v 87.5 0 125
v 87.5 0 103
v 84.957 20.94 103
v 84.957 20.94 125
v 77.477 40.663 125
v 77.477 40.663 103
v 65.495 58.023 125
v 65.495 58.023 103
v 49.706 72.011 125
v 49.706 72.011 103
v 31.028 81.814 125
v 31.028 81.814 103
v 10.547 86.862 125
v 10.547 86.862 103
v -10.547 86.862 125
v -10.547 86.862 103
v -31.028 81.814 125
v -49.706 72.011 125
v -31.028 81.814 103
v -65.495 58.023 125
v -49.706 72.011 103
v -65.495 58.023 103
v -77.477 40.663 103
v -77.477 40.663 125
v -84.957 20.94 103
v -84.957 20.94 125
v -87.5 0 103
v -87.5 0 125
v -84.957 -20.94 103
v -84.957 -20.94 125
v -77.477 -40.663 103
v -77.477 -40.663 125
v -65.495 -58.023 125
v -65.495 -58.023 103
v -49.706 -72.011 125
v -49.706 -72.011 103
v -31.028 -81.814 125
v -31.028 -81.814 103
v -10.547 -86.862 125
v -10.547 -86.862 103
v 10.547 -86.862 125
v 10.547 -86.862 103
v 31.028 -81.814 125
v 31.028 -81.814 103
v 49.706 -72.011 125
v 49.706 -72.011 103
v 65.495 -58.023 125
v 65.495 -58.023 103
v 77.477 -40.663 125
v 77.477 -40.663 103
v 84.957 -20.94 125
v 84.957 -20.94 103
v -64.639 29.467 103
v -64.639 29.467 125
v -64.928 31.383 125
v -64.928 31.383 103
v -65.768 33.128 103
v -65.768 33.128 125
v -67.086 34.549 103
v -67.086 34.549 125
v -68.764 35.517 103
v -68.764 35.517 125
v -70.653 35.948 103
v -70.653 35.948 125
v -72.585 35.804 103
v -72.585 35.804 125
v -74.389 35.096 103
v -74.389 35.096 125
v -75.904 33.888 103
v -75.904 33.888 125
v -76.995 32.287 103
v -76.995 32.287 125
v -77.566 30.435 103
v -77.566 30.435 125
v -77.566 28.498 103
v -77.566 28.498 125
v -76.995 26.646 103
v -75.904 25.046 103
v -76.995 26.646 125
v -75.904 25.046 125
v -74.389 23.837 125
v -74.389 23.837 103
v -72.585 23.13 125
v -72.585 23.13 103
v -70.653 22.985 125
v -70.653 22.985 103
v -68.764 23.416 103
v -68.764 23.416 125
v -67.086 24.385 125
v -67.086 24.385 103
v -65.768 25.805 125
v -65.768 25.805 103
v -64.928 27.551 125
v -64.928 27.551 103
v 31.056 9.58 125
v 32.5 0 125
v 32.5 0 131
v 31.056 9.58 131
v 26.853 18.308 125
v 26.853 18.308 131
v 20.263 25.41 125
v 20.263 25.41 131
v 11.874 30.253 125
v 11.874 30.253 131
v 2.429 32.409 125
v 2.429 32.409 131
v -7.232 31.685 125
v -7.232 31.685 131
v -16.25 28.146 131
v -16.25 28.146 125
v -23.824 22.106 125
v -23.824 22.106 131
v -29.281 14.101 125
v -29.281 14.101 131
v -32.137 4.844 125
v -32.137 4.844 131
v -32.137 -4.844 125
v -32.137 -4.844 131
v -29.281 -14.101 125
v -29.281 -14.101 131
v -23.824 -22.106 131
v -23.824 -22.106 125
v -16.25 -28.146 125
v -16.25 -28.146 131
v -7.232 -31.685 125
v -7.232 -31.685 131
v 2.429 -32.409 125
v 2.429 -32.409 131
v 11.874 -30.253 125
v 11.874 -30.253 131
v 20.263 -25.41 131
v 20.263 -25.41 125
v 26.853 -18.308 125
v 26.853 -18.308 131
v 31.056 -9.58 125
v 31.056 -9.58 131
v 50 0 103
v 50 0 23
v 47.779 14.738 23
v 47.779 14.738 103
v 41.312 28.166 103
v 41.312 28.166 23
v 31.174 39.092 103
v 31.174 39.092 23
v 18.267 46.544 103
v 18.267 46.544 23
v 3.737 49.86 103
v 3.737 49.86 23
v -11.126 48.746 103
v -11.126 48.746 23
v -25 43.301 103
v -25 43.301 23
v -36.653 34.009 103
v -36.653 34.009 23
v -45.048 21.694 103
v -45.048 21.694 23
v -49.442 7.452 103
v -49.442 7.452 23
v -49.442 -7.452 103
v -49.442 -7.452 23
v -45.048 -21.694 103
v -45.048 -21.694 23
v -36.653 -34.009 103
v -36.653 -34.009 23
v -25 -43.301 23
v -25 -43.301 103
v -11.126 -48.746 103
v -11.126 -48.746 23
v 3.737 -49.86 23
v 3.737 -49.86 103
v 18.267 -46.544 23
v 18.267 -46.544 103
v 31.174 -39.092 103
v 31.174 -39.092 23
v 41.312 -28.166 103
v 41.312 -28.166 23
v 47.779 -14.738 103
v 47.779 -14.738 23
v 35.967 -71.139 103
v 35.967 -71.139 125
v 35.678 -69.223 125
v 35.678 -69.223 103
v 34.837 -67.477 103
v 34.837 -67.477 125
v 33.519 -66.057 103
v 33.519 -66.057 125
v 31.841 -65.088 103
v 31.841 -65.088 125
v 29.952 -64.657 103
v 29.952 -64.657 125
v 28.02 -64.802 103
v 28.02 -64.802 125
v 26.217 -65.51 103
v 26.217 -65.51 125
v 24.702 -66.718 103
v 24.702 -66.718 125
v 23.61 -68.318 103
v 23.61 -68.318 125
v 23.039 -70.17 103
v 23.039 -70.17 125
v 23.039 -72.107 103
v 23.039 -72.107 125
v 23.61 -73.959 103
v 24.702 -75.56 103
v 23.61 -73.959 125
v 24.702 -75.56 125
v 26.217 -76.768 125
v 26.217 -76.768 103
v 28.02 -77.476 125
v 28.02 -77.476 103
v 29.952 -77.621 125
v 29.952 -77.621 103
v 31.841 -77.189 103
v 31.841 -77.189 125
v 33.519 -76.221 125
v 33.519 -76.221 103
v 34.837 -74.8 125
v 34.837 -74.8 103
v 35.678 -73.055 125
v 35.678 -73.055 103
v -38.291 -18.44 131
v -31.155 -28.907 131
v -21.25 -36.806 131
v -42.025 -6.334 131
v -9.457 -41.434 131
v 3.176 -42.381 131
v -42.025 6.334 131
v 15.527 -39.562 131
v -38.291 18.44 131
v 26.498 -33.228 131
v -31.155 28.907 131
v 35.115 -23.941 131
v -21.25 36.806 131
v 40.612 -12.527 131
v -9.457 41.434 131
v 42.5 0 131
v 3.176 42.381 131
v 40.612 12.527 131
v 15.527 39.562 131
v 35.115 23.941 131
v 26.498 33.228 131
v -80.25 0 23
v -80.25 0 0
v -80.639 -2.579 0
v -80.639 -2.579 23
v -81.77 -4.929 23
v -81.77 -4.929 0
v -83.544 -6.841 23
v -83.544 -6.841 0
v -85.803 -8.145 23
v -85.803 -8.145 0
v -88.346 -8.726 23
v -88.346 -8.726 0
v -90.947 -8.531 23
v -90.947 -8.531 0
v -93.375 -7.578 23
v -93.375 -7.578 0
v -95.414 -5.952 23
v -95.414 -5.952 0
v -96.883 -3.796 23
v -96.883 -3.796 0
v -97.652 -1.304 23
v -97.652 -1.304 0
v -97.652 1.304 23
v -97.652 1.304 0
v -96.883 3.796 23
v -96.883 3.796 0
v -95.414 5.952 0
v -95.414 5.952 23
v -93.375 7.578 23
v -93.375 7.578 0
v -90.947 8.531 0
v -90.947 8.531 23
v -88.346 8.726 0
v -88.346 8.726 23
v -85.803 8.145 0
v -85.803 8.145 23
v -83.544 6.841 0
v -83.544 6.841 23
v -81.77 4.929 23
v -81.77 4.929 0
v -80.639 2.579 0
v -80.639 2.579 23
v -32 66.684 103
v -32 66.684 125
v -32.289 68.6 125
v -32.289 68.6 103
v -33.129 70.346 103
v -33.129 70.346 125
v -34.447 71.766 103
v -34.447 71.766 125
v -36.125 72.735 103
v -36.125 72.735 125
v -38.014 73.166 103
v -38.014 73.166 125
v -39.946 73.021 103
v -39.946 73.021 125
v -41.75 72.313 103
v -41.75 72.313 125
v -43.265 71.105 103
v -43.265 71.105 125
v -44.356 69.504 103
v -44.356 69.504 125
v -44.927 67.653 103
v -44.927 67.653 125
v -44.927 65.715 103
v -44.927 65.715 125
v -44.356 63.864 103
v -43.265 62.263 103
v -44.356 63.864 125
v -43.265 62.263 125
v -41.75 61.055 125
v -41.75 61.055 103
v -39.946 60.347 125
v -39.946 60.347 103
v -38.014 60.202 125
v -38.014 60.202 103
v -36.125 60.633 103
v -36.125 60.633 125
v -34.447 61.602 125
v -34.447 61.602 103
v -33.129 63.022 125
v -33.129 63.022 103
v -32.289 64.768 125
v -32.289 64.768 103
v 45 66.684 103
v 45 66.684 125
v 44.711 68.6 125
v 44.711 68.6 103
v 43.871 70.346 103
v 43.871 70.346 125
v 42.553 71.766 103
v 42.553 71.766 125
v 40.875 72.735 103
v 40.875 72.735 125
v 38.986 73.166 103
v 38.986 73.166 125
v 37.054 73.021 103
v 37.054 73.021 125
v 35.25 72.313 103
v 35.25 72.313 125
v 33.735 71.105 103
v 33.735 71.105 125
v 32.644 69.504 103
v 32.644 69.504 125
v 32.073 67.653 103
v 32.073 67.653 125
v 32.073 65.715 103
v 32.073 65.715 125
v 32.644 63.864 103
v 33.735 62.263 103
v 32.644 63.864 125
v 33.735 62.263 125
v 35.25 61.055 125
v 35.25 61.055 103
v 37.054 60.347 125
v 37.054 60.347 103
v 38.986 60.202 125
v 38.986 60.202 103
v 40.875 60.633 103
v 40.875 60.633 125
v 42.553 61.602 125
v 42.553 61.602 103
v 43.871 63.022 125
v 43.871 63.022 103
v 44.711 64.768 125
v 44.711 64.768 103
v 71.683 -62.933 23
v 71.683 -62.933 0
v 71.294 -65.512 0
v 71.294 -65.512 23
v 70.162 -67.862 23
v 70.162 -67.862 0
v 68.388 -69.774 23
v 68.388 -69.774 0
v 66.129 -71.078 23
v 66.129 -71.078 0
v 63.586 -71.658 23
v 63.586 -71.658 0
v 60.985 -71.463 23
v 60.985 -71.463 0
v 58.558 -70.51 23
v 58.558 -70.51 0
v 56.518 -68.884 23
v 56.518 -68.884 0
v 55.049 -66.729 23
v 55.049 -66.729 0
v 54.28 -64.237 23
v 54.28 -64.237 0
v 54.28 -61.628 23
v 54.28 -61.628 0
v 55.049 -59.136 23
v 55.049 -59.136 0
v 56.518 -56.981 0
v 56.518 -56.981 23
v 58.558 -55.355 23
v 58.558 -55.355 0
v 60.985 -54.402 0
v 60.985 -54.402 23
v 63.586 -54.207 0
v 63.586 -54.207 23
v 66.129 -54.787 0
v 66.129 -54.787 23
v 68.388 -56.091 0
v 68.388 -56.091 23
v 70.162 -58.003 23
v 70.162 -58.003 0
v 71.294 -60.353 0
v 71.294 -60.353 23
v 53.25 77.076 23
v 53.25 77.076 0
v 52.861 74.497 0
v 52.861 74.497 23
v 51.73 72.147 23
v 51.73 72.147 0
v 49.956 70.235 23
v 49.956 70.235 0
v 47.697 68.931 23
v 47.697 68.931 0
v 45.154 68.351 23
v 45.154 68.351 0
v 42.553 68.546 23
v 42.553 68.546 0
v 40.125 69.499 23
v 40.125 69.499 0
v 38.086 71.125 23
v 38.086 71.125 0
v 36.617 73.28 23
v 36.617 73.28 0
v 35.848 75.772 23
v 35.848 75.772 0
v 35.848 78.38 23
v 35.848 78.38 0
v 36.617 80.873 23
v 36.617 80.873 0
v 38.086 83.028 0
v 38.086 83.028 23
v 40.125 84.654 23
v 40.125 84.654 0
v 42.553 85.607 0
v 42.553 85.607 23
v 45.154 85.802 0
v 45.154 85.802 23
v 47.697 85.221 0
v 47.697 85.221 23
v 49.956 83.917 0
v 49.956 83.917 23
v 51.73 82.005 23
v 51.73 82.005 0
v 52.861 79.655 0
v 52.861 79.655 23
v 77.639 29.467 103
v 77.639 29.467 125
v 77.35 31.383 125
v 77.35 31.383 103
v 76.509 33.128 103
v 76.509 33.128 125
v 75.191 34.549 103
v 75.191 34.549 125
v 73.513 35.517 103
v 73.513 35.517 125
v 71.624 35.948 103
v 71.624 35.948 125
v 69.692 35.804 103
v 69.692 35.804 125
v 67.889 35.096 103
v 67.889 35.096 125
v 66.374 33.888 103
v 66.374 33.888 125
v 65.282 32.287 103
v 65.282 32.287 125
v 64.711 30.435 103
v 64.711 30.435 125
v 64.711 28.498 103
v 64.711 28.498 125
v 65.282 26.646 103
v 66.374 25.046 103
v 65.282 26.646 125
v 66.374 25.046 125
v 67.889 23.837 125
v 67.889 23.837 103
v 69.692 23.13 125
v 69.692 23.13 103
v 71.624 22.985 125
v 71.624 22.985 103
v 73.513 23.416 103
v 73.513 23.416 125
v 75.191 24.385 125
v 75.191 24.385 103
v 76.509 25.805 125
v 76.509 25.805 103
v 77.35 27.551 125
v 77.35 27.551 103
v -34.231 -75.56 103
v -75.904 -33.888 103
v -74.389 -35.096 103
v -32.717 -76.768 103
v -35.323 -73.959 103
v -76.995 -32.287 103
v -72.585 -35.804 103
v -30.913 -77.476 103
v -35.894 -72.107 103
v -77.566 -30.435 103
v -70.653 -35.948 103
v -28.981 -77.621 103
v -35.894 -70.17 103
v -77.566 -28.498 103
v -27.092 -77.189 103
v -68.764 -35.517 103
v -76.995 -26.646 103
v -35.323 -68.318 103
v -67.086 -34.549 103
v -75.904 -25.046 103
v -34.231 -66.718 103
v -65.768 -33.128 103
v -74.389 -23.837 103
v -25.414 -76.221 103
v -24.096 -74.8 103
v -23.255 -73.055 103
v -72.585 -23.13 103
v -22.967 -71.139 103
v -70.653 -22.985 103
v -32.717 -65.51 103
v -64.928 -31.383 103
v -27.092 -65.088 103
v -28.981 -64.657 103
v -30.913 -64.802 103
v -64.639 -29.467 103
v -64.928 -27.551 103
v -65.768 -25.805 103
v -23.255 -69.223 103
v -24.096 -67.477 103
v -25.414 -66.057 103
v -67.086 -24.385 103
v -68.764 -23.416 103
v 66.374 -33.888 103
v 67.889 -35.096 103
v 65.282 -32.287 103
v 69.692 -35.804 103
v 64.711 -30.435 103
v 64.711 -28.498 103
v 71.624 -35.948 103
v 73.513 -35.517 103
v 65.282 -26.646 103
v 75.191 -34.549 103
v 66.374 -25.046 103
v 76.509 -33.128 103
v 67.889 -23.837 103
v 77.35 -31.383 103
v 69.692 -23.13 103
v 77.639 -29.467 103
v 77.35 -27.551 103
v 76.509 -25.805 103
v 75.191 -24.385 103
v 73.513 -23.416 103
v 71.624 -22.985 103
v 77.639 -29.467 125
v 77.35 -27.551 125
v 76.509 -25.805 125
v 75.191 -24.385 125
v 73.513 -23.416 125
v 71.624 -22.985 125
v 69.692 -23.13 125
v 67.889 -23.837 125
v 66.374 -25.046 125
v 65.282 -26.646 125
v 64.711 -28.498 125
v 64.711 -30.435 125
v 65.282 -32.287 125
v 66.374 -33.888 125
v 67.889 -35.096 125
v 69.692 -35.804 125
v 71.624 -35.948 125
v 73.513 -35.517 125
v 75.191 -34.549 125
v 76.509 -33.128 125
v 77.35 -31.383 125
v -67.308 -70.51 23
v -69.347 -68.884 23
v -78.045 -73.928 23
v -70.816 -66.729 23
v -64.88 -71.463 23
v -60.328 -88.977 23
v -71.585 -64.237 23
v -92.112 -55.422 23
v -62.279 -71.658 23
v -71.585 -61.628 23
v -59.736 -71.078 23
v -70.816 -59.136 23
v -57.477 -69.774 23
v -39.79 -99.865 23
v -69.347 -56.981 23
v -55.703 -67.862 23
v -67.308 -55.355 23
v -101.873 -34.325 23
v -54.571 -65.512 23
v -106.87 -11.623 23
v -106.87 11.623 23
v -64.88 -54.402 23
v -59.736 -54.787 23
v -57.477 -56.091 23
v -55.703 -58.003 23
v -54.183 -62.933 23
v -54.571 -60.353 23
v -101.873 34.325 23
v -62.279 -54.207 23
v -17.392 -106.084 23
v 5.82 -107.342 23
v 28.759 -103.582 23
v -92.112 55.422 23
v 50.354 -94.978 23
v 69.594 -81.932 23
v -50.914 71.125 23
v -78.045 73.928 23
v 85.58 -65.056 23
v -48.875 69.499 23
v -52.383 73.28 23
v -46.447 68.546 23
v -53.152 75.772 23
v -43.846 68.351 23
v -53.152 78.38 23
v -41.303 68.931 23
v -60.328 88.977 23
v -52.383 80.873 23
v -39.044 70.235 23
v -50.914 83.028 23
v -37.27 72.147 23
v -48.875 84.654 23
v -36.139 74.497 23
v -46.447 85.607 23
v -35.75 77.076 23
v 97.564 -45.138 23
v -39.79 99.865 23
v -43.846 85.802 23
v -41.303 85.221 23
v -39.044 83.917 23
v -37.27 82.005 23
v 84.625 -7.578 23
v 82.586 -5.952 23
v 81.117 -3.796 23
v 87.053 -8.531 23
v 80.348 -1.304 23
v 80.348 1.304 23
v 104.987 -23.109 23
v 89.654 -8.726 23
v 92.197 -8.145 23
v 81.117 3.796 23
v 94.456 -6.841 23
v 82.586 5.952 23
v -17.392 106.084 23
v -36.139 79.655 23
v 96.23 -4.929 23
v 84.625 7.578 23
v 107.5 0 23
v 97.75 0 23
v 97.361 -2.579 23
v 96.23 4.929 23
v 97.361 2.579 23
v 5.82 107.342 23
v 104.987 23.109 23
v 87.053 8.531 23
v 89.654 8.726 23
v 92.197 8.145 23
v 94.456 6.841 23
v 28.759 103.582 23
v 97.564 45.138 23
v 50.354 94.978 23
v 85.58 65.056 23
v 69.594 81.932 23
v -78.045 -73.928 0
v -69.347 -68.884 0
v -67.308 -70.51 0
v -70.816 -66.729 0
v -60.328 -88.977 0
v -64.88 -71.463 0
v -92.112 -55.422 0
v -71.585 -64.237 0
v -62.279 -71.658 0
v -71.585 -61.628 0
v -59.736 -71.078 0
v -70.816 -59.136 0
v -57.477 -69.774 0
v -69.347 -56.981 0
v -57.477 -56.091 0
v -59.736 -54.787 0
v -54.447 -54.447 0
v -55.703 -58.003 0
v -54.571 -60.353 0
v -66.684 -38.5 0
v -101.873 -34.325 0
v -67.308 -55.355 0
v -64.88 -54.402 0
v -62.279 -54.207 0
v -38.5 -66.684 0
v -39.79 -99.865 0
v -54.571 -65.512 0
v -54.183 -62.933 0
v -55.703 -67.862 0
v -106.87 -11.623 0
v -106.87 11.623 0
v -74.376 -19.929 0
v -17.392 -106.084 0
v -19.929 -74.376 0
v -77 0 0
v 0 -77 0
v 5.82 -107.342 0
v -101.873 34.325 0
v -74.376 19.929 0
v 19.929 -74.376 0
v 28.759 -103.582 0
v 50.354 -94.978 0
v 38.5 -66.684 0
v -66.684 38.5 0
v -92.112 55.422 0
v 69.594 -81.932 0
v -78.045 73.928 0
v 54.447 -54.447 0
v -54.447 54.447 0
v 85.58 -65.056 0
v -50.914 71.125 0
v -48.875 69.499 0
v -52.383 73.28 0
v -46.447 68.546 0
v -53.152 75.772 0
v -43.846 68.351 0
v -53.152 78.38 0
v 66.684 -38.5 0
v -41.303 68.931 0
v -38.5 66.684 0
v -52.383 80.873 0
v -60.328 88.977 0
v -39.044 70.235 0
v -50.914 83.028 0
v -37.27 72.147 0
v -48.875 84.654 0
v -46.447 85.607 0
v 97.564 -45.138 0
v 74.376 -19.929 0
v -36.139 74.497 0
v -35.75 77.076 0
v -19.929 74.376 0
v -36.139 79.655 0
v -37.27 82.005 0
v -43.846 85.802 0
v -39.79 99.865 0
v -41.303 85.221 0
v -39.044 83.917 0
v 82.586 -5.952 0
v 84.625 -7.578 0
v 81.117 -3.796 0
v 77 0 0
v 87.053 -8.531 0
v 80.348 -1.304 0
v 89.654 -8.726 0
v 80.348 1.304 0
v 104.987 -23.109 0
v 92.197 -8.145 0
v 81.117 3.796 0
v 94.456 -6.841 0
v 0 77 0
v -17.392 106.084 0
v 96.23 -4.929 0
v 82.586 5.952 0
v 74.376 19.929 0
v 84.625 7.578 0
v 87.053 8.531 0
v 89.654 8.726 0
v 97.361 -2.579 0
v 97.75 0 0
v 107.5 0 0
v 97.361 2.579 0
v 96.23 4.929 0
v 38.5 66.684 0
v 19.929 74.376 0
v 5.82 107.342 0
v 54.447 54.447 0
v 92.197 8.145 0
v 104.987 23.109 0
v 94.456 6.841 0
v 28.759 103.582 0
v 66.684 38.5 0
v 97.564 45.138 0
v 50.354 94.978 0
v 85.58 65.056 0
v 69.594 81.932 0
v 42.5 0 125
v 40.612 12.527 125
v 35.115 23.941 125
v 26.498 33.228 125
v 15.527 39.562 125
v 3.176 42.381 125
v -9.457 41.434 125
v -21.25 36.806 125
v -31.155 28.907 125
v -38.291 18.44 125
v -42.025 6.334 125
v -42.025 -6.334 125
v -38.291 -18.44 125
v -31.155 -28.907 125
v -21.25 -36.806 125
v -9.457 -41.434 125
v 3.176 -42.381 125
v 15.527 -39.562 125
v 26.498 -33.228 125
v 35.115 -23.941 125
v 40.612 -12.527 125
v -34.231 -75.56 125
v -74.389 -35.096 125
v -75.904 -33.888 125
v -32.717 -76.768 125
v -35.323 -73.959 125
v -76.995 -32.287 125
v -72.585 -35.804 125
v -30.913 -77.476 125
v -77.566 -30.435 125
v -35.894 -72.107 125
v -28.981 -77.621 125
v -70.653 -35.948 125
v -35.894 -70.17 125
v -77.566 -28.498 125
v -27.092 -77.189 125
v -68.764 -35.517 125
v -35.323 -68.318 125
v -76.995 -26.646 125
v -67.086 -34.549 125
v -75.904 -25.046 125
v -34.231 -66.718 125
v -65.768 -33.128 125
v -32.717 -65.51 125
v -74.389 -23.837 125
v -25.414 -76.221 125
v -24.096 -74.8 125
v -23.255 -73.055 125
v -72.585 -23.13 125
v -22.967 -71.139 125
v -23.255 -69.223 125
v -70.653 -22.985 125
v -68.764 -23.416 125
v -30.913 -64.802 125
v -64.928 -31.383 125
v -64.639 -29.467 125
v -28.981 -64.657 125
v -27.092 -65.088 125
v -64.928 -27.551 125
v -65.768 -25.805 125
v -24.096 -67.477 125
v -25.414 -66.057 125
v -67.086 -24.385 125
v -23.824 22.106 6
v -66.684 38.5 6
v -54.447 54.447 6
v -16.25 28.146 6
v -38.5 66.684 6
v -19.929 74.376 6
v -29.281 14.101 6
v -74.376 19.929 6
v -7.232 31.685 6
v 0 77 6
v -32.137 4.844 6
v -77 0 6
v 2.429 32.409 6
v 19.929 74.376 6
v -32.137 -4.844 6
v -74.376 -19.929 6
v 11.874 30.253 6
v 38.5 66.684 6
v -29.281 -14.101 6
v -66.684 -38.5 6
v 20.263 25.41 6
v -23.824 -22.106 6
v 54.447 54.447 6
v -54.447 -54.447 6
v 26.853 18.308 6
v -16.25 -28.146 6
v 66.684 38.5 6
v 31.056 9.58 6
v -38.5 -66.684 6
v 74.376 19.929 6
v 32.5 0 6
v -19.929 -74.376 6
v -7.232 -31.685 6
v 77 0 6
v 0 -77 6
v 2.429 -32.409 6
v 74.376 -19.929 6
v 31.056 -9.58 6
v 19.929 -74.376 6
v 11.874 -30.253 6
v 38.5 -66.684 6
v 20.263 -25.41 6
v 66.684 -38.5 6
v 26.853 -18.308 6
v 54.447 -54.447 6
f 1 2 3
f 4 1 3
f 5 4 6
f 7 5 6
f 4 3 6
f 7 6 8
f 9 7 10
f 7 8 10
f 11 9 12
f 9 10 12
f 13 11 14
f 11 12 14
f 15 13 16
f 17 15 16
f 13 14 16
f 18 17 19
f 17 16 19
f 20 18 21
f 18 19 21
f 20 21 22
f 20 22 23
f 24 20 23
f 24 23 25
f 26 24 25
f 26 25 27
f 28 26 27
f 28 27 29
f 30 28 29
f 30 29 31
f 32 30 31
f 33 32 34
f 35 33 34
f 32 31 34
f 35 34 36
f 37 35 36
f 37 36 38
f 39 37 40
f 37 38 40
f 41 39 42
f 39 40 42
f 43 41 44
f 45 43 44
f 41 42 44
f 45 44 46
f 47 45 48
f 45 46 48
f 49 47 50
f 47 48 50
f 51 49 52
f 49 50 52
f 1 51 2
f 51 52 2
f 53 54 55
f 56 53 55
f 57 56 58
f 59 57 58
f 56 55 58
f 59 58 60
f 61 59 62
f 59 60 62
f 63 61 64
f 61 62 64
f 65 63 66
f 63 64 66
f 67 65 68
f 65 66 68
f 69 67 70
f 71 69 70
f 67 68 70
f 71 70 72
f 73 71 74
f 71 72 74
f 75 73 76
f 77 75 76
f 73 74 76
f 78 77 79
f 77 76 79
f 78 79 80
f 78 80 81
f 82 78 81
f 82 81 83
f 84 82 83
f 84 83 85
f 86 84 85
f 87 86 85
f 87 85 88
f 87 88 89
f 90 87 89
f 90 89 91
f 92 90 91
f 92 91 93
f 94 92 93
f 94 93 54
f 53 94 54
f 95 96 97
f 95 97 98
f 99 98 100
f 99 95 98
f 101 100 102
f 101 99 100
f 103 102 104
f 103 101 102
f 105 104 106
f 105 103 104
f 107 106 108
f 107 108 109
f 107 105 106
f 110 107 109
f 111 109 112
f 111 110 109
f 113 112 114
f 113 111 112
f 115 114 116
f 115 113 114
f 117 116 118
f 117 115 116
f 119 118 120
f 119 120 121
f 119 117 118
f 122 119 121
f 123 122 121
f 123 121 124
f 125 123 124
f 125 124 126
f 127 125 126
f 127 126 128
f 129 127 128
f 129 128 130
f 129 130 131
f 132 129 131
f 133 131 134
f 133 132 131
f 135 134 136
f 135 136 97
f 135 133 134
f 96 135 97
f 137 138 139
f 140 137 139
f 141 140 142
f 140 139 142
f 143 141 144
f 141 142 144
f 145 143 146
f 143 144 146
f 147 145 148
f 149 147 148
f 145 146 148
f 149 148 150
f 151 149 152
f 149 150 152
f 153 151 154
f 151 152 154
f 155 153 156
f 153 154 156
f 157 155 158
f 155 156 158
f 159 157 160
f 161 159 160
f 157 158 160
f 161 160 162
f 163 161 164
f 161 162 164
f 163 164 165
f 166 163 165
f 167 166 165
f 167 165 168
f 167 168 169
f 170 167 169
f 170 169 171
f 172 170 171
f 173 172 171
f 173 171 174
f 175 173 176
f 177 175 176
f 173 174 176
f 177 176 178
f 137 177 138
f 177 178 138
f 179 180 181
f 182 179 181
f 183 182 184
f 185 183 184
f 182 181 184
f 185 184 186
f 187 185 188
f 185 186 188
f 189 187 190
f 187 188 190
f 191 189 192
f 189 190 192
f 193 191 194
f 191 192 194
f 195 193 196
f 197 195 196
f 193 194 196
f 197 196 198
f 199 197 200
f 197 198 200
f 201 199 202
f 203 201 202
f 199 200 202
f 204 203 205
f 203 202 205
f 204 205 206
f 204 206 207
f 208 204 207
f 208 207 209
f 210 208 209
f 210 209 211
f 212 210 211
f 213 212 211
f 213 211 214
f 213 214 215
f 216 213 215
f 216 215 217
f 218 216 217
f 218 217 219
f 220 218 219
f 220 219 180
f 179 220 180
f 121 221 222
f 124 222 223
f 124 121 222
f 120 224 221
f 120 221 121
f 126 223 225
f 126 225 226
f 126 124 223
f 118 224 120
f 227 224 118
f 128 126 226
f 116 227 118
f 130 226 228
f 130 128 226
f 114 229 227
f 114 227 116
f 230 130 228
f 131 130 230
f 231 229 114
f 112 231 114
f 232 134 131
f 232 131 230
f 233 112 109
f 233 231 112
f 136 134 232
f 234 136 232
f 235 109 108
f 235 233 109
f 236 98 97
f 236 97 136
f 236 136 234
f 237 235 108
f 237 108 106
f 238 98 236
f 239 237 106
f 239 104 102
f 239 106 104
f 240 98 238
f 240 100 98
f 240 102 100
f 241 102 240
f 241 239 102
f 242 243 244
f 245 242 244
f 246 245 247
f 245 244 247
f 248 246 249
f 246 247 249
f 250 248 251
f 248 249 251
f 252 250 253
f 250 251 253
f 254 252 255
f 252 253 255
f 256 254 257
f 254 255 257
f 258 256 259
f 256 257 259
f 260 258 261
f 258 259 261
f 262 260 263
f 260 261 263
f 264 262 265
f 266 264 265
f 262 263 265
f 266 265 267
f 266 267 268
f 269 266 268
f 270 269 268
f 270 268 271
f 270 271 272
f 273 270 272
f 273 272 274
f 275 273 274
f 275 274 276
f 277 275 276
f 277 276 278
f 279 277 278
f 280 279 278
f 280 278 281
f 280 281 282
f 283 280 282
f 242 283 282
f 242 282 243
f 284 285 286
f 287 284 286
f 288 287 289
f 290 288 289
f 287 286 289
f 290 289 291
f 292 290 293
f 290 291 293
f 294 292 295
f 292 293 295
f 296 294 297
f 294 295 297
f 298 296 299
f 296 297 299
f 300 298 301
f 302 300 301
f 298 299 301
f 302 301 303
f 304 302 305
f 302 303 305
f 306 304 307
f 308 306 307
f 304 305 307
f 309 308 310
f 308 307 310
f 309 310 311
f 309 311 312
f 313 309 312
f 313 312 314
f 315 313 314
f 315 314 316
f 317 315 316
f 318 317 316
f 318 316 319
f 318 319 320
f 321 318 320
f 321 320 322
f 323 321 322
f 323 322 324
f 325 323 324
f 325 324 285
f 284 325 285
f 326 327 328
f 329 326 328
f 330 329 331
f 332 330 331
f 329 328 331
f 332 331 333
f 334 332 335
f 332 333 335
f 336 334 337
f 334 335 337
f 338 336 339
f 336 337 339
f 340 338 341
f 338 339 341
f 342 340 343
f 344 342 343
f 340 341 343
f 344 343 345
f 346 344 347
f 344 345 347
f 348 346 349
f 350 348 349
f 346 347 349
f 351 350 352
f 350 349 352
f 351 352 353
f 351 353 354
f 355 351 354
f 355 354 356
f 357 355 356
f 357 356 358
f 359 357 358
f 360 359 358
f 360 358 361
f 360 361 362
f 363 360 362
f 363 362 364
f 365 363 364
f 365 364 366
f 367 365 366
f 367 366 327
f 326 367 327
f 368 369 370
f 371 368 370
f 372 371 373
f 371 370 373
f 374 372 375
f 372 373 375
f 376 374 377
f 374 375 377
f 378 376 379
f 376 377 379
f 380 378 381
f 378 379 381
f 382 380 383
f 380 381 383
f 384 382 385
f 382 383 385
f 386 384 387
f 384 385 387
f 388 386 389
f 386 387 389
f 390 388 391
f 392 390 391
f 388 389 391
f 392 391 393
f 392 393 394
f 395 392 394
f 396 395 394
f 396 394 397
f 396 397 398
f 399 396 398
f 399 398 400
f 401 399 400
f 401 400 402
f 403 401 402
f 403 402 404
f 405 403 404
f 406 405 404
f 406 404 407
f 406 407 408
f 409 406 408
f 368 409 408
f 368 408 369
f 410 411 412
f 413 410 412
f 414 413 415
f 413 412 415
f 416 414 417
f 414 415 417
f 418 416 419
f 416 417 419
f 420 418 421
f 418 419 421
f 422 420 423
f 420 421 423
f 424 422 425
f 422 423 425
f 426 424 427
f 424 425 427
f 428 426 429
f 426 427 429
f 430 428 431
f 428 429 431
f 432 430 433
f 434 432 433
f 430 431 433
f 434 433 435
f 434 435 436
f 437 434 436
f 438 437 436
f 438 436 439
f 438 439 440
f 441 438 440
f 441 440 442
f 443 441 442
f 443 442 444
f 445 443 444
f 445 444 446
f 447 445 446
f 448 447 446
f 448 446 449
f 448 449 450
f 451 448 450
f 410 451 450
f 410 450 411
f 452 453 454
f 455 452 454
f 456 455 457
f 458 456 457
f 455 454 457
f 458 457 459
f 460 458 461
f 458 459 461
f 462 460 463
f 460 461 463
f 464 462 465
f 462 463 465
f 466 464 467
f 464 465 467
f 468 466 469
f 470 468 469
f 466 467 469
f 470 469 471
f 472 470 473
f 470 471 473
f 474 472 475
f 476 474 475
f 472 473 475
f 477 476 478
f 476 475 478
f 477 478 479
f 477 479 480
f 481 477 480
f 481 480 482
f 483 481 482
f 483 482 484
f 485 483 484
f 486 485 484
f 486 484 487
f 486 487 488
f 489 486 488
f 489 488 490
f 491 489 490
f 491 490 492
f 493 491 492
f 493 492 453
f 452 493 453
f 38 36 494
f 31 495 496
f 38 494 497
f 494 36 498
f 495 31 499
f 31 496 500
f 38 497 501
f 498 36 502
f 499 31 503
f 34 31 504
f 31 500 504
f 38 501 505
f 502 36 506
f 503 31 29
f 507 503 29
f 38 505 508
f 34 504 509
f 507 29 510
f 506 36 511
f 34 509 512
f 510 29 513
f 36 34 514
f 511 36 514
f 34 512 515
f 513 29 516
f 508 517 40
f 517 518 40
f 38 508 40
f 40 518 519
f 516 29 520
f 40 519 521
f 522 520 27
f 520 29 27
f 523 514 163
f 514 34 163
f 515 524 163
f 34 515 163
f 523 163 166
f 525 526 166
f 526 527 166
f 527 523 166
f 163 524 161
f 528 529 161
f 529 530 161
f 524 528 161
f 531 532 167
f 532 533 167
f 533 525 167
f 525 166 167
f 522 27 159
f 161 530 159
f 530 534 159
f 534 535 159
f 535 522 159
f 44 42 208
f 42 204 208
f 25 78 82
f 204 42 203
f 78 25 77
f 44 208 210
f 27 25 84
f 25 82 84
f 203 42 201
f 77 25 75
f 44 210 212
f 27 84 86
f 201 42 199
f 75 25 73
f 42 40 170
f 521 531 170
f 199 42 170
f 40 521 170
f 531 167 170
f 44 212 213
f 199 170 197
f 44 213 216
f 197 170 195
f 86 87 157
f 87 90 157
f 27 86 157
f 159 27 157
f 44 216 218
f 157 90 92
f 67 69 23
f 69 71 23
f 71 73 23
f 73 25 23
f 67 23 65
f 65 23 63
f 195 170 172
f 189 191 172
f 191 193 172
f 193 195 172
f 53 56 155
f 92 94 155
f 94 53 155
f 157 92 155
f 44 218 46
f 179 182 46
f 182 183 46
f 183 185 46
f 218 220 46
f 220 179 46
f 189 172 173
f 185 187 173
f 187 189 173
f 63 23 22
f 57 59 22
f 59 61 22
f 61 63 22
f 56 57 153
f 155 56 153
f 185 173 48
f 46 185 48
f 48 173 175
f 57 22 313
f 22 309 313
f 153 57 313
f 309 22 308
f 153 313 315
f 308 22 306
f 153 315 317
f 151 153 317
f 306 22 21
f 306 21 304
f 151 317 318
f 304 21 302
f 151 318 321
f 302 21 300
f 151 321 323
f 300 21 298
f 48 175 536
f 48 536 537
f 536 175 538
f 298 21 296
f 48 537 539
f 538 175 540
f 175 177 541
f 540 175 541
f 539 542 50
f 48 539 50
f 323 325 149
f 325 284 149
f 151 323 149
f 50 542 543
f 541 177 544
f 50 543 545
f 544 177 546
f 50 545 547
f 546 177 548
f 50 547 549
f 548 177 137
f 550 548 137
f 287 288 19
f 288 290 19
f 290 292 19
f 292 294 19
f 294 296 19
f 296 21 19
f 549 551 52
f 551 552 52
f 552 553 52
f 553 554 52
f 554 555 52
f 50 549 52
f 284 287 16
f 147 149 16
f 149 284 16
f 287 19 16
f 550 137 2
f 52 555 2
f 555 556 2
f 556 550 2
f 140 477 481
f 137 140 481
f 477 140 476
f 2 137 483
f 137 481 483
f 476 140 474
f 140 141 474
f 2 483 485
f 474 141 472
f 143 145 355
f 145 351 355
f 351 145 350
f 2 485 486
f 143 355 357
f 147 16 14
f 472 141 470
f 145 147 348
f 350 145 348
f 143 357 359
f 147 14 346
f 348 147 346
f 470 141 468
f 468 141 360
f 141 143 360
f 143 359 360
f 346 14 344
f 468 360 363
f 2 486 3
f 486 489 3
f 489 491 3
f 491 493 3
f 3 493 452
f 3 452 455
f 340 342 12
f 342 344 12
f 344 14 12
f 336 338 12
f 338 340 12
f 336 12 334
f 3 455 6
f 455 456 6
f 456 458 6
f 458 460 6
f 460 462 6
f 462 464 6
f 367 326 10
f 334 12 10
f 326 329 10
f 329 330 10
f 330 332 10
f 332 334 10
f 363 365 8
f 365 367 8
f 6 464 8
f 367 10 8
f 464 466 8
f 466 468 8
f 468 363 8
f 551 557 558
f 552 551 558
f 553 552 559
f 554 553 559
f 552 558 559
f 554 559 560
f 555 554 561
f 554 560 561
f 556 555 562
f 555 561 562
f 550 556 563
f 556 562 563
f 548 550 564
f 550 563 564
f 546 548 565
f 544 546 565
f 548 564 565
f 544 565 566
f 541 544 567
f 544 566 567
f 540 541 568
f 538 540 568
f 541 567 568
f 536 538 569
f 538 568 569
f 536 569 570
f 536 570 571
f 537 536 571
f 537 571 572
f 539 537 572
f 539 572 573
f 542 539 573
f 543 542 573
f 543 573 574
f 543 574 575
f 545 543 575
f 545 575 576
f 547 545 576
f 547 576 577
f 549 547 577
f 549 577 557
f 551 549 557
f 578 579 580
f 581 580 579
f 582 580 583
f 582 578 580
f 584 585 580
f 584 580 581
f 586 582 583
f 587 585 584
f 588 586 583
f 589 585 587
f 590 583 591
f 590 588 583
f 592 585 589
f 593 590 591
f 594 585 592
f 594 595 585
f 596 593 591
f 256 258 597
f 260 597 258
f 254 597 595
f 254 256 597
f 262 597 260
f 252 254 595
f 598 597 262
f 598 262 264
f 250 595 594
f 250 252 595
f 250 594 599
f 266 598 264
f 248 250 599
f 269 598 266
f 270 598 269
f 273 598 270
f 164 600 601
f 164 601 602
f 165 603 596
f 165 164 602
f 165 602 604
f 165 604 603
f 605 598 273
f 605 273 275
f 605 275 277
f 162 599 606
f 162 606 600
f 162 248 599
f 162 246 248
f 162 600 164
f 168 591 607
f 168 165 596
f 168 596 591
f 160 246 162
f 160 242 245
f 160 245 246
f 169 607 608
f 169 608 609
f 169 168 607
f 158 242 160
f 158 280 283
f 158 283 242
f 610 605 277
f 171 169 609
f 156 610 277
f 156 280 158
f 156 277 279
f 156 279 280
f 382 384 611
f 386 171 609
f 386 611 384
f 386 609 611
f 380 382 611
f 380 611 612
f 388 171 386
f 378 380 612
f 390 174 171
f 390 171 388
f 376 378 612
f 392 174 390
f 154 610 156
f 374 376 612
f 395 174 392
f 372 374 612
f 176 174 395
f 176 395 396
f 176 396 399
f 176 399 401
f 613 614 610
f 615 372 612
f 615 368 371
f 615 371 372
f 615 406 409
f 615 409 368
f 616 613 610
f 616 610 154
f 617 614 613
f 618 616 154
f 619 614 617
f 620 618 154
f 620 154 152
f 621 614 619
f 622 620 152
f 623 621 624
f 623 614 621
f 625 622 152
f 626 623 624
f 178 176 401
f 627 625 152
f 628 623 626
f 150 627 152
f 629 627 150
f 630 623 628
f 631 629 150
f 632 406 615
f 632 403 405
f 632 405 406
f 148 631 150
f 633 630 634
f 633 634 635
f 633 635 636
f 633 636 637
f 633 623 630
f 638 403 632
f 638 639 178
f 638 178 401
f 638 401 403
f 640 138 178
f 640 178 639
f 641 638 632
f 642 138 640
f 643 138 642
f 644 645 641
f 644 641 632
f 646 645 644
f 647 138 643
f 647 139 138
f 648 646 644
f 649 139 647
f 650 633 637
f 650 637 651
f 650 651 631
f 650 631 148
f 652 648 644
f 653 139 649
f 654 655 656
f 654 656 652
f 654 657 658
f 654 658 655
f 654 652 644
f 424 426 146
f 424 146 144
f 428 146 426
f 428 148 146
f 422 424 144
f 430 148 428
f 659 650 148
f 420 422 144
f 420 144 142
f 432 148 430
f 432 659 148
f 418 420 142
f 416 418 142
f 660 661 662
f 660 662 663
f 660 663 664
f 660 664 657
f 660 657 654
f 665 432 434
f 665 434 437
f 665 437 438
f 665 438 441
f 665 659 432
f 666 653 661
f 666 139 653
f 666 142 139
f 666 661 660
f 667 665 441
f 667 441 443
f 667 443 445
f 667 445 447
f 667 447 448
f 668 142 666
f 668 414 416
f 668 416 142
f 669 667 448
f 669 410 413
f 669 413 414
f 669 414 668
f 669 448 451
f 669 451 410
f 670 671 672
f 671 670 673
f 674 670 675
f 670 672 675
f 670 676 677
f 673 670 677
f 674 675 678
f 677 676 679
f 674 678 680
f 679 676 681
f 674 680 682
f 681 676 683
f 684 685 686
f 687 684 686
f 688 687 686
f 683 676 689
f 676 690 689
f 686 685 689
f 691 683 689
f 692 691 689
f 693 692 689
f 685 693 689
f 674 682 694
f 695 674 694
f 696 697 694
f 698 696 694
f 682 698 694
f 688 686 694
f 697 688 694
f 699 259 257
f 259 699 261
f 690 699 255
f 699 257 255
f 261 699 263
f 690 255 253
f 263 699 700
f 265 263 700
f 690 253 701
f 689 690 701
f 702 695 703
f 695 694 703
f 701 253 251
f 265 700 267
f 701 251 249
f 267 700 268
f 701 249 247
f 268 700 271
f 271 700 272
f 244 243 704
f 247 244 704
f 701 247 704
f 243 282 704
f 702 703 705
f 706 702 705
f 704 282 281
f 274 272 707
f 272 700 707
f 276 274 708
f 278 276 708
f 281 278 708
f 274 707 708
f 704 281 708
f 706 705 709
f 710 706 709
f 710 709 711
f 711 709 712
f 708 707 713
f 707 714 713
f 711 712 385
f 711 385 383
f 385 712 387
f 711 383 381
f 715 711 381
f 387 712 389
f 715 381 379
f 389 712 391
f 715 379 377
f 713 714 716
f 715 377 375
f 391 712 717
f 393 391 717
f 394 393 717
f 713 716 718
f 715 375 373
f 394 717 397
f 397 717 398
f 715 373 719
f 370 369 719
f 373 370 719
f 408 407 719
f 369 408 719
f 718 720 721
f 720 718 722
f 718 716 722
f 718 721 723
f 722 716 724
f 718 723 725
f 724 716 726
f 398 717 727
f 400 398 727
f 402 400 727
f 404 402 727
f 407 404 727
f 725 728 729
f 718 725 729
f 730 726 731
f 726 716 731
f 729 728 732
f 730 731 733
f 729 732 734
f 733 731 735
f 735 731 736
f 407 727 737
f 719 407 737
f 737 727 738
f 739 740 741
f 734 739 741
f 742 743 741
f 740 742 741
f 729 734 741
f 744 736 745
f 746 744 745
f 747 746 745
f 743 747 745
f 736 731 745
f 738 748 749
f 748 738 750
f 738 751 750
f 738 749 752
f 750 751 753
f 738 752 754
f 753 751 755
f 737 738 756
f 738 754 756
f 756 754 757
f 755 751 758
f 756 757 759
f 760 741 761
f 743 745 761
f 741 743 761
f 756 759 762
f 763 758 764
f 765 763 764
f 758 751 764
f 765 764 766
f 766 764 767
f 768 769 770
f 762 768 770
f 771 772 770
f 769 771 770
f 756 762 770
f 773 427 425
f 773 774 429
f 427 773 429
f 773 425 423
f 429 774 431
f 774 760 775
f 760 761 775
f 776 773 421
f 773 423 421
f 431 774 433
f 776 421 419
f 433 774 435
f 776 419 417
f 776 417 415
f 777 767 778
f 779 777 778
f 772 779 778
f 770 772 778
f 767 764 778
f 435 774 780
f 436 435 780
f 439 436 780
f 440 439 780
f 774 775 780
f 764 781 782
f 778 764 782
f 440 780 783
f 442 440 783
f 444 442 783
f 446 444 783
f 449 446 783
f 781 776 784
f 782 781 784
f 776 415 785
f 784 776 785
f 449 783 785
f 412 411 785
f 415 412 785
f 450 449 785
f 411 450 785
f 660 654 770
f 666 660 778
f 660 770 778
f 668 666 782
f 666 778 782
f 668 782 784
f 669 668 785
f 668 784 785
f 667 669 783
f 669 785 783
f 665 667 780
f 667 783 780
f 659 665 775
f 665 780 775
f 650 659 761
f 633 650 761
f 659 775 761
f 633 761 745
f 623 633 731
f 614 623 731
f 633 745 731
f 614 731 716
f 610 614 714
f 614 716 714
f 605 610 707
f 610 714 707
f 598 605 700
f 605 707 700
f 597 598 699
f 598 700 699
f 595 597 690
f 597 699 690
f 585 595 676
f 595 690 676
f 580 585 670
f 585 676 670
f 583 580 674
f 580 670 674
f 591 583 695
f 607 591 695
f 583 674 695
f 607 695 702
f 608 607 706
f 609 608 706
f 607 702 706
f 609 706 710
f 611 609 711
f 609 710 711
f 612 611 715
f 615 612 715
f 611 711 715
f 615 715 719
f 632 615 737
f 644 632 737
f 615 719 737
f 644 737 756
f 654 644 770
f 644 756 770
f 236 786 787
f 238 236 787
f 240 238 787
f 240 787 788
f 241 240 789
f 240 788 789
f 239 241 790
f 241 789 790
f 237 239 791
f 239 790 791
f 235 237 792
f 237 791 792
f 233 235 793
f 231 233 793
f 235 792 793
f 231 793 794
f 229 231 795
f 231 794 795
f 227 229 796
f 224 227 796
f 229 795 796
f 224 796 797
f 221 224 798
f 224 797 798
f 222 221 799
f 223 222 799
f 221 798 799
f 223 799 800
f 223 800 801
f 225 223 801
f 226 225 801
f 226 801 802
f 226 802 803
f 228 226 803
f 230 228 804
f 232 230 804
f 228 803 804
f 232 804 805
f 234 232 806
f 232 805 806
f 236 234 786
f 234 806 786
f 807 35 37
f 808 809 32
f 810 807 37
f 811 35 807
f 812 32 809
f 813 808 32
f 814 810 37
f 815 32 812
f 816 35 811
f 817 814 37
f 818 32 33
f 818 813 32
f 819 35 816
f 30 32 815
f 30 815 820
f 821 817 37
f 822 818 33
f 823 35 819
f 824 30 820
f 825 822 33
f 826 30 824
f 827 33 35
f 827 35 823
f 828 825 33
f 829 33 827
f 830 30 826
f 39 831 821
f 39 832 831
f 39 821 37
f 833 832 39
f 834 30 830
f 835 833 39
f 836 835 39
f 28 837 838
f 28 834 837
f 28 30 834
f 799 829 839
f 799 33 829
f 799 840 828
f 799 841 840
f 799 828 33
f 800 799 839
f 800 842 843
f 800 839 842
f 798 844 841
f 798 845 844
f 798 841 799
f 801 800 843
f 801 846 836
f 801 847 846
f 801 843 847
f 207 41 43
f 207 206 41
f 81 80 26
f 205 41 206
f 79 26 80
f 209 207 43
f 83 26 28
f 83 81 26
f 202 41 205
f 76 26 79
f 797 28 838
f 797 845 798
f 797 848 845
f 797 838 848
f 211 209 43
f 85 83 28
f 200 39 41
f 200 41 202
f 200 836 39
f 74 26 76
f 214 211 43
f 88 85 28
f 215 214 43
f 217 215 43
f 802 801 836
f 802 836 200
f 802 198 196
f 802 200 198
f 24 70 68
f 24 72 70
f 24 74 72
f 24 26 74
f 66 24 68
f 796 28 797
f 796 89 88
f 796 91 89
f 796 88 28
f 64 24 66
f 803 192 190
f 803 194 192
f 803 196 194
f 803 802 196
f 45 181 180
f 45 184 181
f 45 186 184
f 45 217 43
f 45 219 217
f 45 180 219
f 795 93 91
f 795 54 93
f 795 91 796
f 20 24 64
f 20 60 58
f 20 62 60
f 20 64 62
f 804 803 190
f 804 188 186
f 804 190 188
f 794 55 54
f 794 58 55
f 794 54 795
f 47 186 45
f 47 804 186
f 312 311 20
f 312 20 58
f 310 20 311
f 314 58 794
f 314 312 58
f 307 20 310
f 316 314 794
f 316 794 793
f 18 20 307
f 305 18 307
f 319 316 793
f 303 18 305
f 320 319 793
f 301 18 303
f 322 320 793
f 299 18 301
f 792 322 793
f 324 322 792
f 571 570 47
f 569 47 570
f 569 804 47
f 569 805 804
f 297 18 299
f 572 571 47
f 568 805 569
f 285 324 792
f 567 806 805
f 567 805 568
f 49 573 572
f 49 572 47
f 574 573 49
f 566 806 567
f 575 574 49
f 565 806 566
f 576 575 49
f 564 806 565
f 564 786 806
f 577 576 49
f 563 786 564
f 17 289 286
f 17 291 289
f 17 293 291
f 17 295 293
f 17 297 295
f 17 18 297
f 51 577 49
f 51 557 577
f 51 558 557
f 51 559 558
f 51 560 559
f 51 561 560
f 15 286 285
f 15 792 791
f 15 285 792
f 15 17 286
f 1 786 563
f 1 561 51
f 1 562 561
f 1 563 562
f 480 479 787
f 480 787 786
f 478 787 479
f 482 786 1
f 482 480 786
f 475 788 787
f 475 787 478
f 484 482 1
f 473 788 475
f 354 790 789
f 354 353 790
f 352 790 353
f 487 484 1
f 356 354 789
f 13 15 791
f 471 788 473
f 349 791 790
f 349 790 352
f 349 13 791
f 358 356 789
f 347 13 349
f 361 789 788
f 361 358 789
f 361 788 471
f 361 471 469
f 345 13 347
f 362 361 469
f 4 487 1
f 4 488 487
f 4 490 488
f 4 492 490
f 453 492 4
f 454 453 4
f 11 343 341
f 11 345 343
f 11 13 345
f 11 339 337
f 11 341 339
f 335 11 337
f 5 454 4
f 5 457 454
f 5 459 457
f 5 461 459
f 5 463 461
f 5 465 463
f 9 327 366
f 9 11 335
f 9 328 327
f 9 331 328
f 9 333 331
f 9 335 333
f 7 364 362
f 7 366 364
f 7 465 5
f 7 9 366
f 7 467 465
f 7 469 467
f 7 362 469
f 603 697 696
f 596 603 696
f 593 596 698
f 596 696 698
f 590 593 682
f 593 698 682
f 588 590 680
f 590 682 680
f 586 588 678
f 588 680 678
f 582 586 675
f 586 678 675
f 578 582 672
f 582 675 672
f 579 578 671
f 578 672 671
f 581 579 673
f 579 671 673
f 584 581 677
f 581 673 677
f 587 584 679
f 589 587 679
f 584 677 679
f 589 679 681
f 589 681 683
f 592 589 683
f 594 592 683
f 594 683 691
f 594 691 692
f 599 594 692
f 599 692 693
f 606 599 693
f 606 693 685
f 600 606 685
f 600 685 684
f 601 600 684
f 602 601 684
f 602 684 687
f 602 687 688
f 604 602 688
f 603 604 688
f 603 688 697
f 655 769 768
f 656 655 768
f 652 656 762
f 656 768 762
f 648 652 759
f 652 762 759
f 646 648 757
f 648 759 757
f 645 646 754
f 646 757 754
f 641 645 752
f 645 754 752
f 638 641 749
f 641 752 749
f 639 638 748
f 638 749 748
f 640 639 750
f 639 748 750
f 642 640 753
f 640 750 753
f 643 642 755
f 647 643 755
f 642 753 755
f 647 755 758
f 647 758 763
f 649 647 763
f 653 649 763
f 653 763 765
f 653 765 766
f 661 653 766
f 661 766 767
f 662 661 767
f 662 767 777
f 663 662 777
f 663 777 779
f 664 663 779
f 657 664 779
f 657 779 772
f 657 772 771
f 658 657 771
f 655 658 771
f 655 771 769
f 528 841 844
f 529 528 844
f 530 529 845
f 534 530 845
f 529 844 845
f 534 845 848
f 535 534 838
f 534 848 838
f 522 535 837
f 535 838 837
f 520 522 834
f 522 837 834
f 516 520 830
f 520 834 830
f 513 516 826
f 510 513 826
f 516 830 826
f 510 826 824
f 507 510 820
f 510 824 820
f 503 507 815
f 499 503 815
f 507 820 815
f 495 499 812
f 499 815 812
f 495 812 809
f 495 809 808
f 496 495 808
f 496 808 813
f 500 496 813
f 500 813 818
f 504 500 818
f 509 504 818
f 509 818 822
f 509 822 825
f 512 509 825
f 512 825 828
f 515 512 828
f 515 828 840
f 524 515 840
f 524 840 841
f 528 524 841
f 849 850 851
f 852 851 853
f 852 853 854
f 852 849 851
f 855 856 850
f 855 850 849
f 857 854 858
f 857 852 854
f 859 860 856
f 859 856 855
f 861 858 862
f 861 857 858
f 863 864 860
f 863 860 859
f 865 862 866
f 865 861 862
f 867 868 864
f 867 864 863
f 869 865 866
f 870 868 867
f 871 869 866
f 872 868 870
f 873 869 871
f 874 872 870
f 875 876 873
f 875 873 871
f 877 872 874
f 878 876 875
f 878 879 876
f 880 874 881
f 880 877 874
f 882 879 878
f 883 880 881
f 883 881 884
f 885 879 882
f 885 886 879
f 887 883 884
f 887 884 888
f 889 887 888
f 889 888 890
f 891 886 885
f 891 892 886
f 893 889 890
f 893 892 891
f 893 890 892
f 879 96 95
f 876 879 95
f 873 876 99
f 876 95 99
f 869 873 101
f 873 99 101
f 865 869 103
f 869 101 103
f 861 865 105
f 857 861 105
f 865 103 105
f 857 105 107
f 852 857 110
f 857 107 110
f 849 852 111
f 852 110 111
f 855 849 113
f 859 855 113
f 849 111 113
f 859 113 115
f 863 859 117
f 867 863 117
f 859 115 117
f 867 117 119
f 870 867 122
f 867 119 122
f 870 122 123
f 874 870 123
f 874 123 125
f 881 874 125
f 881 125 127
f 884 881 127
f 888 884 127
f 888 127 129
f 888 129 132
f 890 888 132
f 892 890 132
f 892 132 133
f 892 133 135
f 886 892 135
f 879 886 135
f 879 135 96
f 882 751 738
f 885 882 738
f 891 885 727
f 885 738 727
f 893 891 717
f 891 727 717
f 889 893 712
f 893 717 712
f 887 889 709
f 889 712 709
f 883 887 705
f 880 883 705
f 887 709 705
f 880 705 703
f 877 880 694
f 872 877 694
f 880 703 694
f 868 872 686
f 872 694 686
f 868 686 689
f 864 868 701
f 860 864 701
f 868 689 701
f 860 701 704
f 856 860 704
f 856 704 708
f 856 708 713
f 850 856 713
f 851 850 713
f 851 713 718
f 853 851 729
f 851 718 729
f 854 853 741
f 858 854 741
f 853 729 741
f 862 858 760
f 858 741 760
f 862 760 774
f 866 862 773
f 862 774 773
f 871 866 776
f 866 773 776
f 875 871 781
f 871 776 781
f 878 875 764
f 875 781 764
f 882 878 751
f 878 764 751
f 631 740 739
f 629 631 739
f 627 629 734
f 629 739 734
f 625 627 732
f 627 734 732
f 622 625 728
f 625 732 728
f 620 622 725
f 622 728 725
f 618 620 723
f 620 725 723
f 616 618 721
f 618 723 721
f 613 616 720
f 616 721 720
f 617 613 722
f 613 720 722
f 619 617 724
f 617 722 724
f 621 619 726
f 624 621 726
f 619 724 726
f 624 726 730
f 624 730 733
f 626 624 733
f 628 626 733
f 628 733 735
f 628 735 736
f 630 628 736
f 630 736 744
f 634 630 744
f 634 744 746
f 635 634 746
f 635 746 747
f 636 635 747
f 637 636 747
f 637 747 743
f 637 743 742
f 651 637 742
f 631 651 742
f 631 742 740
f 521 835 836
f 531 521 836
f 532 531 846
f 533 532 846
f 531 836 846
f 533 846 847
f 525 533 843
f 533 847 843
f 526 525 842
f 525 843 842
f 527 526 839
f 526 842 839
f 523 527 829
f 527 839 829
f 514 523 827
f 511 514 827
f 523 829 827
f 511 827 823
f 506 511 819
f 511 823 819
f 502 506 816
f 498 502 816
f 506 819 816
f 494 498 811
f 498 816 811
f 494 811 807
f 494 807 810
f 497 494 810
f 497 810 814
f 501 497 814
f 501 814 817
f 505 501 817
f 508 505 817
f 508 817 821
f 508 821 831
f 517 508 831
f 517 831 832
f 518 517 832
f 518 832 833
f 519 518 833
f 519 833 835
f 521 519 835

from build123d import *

# Parameters (mm, degrees)
F0_R      = 107.5
F1_DEPTH  = 23
F2_R      = 50
F3_DEPTH  = 80
F4_R      = 87.5
F4_R_2    = 50
F5_DEPTH  = 22
F6_R      = 42.5
F6_R_2    = 32.5
F7_DEPTH  = 6
F7_FACE_R = 32.5
F8_DEPTH  = 125.001
F9_R      = 77
F10_DEPTH = 6
F11_R     = 6.5
F12_DEPTH = 25
F13_R     = 8.75
F14_DEPTH = 25


with BuildPart() as f1:
    # F0 (on Top) → F1 (new body)
    with BuildSketch(Plane.XY):
        Circle(F0_R)
    extrude(amount=F1_DEPTH)

    # F2 (on face) → F3 (join)
    with BuildSketch(Plane.XY.offset(23)):
        Circle(F2_R)
    extrude(amount=F3_DEPTH)

    # F4 (on face) → F5 (join)
    with BuildSketch(Plane.XY.offset(103)):
        Circle(F4_R)
        Circle(F4_R_2, mode=Mode.SUBTRACT)
        Circle(F4_R_2)
    extrude(amount=F5_DEPTH)

    # F6 (on face) → F7 (join)
    with BuildSketch(Plane.XY.offset(125)):
        Circle(F6_R)
        Circle(F6_R_2, mode=Mode.SUBTRACT)
    extrude(amount=F7_DEPTH)

    # F7_face (on face) → F8 (cut, through all)
    with BuildSketch(Plane.XY.offset(125)):
        Circle(F7_FACE_R)
    extrude(amount=-F8_DEPTH, mode=Mode.SUBTRACT)

    # F9 (on face) → F10 (cut)
    with BuildSketch(Plane(origin=(0, 0, 0), x_dir=(1, 0, 0), z_dir=(0, 0, -1))):
        Circle(F9_R)
    extrude(amount=-F10_DEPTH, mode=Mode.SUBTRACT)

    # F11 (on face) → F12 (cut)
    with BuildSketch(Plane.XY.offset(125)):
        with Locations((-38.5, 66.683956)):
            Circle(F11_R)
        with Locations((38.5, 66.683956)):
            Circle(F11_R)
        with Locations((71.138724, 29.466624)):
            Circle(F11_R)
        with Locations((71.138724, -29.466624)):
            Circle(F11_R)
        with Locations((29.466624, -71.138724)):
            Circle(F11_R)
        with Locations((-29.466624, -71.138724)):
            Circle(F11_R)
        with Locations((-71.138724, -29.466624)):
            Circle(F11_R)
        with Locations((-71.138724, 29.466624)):
            Circle(F11_R)
    extrude(amount=-F12_DEPTH, mode=Mode.SUBTRACT)

    # F13 (on face) → F14 (cut)
    with BuildSketch(Plane(origin=(0, 0, 0), x_dir=(1, 0, 0), z_dir=(0, 0, -1))):
        with Locations((-62.932504, 62.932504)):
            Circle(F13_R)
        with Locations((62.932504, 62.932504)):
            Circle(F13_R)
        with Locations((89, 0)):
            Circle(F13_R)
        with Locations((44.5, -77.076261)):
            Circle(F13_R)
        with Locations((-44.5, -77.076261)):
            Circle(F13_R)
        with Locations((-89, 0)):
            Circle(F13_R)
    extrude(amount=-F14_DEPTH, mode=Mode.SUBTRACT)


solid = f1.part
